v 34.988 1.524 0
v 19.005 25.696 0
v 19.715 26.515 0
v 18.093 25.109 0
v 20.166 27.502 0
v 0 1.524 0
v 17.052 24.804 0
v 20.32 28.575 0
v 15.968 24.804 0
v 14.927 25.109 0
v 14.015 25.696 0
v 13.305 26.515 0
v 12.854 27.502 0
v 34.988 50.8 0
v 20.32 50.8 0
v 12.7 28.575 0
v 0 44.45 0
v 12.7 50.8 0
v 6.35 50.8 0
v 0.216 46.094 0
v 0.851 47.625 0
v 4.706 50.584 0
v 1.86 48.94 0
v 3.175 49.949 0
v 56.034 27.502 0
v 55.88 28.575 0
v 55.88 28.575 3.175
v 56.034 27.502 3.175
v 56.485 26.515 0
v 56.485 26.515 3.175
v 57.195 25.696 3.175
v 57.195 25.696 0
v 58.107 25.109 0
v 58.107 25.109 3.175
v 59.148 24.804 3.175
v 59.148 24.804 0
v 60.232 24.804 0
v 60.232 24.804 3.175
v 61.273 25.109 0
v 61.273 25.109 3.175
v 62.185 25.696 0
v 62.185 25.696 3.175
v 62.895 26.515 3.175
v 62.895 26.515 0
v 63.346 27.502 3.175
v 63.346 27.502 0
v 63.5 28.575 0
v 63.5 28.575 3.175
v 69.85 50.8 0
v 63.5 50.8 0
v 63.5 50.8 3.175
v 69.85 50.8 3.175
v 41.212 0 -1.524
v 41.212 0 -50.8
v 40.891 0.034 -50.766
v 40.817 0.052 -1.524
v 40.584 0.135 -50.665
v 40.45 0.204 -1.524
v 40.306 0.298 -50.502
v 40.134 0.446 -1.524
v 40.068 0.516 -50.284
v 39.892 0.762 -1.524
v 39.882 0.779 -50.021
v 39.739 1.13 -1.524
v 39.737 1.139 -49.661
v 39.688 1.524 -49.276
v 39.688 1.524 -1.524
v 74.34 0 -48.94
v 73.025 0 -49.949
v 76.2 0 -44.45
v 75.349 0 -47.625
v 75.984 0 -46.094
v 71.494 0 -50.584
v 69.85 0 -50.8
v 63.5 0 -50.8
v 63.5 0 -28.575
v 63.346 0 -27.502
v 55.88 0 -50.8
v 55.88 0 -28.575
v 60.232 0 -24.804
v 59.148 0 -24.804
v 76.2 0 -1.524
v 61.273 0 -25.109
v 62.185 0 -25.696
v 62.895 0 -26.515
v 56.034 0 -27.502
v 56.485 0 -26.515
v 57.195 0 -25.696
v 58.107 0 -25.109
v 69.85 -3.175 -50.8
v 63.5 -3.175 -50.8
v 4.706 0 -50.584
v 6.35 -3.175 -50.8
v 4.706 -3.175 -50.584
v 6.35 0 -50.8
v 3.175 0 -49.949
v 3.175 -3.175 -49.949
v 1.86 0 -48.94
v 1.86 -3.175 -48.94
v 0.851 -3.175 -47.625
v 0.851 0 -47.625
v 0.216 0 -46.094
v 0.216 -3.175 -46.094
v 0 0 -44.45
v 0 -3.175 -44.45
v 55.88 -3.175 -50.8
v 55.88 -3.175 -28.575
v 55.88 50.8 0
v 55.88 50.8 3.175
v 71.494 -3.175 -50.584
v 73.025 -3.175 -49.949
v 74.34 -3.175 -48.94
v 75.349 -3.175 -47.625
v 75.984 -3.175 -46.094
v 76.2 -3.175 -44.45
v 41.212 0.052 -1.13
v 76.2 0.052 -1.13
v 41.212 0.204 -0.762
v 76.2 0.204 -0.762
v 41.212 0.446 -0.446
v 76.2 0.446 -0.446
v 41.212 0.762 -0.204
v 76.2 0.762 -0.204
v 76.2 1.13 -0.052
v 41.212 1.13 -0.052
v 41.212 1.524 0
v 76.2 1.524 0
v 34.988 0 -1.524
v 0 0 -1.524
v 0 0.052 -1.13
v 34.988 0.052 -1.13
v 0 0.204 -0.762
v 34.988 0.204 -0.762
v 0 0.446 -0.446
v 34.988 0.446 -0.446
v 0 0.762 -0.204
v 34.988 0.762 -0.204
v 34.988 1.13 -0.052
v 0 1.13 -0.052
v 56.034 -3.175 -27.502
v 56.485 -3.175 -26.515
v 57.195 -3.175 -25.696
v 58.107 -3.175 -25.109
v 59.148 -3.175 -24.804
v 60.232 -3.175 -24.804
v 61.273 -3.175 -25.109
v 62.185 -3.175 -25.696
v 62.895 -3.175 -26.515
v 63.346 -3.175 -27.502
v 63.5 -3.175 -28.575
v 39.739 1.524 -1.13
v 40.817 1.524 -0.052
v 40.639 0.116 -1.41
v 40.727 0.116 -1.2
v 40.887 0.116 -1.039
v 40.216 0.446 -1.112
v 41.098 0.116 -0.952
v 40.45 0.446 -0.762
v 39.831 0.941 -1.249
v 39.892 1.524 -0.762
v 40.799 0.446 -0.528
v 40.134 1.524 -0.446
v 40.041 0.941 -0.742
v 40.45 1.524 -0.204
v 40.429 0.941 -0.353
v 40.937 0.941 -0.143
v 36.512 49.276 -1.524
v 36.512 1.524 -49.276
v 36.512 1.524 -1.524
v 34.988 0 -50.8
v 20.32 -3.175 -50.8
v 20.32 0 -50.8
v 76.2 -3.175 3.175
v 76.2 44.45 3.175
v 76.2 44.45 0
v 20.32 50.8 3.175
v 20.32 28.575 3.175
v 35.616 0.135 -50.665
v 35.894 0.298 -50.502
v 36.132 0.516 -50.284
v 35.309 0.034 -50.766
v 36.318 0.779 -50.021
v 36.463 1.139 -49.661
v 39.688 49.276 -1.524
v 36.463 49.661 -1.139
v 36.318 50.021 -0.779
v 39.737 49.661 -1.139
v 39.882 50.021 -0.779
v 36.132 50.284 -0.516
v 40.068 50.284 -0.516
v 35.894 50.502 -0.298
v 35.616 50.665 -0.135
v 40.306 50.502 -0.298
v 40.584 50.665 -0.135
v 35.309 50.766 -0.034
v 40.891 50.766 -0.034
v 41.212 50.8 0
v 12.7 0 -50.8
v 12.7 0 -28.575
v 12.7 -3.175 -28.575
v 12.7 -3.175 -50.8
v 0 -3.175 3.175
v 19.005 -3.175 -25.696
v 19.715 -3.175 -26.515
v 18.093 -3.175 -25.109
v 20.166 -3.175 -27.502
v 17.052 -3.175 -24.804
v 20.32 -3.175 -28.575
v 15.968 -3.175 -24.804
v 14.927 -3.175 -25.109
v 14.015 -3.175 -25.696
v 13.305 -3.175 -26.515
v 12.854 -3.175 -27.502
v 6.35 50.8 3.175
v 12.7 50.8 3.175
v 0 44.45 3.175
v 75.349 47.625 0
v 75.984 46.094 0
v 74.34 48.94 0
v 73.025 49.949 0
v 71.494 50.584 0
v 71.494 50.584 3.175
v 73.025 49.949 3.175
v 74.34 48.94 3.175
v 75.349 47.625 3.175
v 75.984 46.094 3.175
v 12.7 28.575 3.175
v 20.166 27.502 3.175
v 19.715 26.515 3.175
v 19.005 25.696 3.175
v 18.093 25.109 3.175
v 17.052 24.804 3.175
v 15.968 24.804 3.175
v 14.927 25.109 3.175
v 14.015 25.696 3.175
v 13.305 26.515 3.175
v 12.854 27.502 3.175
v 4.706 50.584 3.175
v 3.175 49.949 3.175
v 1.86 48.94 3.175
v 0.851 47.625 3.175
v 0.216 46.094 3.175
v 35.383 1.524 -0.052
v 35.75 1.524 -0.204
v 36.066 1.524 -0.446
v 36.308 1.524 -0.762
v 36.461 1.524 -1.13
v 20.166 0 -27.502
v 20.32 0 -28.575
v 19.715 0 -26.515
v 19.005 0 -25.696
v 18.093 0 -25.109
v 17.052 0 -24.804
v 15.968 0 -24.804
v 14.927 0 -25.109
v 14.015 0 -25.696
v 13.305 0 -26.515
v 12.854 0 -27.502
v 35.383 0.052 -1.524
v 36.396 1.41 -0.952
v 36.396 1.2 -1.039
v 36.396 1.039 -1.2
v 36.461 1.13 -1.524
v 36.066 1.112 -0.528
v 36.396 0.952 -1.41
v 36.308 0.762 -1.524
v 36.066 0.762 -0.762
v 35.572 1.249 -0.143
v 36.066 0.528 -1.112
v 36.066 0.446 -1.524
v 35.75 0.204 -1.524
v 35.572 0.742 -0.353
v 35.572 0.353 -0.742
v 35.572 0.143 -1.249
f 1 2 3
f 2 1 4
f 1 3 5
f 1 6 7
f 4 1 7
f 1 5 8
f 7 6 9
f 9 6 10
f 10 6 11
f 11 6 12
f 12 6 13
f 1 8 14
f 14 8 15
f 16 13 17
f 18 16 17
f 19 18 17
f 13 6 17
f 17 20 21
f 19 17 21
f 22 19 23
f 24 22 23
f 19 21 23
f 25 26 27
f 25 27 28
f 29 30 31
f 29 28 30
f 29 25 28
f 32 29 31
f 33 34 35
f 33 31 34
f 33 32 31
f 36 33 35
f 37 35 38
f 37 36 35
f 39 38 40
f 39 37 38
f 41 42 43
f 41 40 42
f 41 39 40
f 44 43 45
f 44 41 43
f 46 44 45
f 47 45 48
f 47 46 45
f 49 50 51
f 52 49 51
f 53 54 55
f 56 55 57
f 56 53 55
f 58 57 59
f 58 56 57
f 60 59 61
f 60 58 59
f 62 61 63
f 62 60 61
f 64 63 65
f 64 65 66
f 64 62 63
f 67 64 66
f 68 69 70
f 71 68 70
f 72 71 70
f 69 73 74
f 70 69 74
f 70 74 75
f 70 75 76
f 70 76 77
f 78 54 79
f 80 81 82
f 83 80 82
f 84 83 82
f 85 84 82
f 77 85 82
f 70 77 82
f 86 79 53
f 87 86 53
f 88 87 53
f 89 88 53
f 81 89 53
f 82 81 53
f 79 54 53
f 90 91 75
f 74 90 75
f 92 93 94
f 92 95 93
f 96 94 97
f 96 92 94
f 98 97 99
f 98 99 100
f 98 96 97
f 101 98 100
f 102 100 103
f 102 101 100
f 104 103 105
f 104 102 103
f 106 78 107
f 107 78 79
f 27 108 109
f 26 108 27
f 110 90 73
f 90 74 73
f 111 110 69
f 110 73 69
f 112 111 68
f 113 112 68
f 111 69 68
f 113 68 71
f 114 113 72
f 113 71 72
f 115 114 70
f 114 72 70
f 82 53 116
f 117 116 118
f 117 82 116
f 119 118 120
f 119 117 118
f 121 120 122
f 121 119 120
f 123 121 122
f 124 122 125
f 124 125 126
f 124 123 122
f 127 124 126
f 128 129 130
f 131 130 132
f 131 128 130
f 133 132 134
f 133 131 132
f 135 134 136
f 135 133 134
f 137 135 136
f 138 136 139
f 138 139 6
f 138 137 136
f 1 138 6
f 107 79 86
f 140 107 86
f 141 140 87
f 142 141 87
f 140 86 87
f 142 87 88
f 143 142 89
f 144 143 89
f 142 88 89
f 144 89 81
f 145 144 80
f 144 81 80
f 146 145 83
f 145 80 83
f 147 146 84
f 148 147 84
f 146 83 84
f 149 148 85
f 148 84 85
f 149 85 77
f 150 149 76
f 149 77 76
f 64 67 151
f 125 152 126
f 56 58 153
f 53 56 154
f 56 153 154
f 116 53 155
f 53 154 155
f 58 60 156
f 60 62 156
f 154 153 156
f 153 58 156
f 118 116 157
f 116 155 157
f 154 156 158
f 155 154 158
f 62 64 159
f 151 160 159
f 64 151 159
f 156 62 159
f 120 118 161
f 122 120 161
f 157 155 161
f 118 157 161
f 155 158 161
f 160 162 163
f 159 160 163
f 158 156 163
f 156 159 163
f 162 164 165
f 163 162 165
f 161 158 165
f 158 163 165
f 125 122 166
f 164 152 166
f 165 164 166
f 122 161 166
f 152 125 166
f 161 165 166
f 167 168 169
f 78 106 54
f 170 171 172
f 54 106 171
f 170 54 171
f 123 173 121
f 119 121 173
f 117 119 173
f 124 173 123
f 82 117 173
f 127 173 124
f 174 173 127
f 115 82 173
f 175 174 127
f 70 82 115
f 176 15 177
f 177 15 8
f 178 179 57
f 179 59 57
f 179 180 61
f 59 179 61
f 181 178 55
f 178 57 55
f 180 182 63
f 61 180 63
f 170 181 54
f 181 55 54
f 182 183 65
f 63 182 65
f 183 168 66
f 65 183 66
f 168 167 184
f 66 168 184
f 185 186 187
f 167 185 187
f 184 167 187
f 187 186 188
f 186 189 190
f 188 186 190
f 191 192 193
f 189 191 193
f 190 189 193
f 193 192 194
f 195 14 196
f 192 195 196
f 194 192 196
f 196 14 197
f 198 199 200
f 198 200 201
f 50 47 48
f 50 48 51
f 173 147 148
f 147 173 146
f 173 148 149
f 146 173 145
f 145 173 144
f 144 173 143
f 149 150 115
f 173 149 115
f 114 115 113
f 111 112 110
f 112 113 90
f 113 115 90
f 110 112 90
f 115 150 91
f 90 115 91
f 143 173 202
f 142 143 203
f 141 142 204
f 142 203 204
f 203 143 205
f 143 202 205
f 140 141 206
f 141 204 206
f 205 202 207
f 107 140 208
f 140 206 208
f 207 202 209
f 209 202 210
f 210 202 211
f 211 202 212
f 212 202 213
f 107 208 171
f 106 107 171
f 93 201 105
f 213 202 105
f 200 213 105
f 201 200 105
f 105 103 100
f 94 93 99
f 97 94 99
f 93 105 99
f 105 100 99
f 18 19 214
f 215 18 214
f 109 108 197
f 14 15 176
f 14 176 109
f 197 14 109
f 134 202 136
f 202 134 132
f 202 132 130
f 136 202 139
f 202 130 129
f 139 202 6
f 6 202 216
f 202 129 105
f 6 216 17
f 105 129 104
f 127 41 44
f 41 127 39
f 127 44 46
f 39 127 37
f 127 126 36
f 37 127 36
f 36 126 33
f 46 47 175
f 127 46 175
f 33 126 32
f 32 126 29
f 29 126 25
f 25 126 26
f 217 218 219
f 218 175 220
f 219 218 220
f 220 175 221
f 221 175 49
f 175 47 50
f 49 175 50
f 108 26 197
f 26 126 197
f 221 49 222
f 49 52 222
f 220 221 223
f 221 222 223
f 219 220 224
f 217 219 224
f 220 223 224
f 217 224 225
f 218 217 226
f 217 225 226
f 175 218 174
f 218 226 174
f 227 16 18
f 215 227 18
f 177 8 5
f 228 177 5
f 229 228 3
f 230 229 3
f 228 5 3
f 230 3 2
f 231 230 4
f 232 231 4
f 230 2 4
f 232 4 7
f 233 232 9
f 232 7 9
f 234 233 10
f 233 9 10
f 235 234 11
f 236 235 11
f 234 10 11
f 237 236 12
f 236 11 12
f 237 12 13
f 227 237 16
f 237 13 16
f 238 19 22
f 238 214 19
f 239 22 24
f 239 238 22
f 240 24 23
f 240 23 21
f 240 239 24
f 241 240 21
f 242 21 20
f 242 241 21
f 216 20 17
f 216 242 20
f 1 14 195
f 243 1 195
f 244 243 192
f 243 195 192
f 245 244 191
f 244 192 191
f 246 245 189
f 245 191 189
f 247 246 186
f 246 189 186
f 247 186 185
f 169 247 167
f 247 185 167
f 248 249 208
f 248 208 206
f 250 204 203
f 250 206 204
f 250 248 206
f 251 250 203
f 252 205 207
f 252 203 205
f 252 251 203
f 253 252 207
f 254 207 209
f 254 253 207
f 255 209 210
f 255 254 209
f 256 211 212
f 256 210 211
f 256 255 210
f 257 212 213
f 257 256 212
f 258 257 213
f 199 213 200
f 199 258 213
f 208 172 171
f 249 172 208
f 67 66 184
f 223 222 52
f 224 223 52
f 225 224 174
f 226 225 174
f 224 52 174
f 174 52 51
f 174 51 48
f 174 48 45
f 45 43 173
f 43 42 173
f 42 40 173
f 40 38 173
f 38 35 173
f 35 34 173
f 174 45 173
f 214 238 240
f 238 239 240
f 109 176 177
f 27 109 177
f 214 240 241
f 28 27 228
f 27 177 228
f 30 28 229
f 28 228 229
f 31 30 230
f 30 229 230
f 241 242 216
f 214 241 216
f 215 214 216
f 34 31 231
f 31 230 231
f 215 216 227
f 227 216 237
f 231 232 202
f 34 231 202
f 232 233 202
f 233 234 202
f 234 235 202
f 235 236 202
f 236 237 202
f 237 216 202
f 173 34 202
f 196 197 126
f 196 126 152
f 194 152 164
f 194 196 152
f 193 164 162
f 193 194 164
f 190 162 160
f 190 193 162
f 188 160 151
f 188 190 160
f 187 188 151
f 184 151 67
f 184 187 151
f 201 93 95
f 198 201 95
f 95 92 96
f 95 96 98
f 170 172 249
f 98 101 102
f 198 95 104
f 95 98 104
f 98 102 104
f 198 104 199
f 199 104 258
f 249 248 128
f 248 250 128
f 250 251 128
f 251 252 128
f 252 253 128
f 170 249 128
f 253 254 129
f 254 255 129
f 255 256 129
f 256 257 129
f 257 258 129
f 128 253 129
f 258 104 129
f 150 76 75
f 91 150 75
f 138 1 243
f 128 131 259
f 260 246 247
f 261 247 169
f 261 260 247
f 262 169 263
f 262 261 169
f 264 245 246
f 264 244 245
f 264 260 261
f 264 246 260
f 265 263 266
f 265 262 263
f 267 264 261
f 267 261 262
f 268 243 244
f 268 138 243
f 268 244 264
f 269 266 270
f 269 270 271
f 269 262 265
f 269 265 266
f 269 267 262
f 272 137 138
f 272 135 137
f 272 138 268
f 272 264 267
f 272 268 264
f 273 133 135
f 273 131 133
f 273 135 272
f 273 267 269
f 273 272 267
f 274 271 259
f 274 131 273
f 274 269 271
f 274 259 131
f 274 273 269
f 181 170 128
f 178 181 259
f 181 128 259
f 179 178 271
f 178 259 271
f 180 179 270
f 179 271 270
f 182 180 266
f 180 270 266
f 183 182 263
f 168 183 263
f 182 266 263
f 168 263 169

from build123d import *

# Parameters (mm, degrees)
EXTRUDE_THIN1_DEPTH = 76.2
FILLET1_R           = 6.35
BOSS_EXTRUDE1_REACH = 88.253
SKETCH2_W           = 3.175
SKETCH2_H           = 71.842048968
CUT_EXTRUDE1_DEPTH  = 105.726882891
CUT_EXTRUDE2_DEPTH  = 105.726882891
FILLET2_R           = 1.524


with BuildPart() as part:
    # Sketch1 → Extrude-Thin1 (new body)
    with BuildSketch(Plane(origin=(0, 0, 0), x_dir=(0, 0, -1), z_dir=(1, 0, 0))):
        Polygon((50.8, 0), (0, 0), (0, 50.8), (-3.175, 50.8), (-3.175, -3.175), (50.8, -3.175), align=None)
    extrude(amount=EXTRUDE_THIN1_DEPTH)

    # Fillet1
    fillet1_edges = [part.edges().sort_by_distance(p)[0] for p in [
        (76.2, -1.5875, -50.8),
        (0, -1.5875, -50.8),
        (0, 50.8, 1.5875),
        (76.2, 50.8, 1.5875),
    ]]
    fillet(fillet1_edges, radius=FILLET1_R)

    # Sketch2 → Boss-Extrude1 (add, up to next)
    with BuildSketch(Plane(origin=(0, 25.4, -25.4), x_dir=(1, 0, 0), z_dir=(0, -0.7071067811865477, 0.7071067811865475)), mode=Mode.PRIVATE) as boss_extrude1_sk1:
        with Locations((38.1, 0)):
            Rectangle(SKETCH2_W, SKETCH2_H)
    boss_extrude1_tool1 = extrude(boss_extrude1_sk1.sketch, amount=BOSS_EXTRUDE1_REACH, mode=Mode.PRIVATE) - part.part
    add(boss_extrude1_tool1.solids().sort_by_distance((38.1, 25.4, -25.4))[0])

    # Sketch3 → Cut-Extrude1 (cut, through all)
    with BuildSketch(Plane.XY):
        with BuildLine():
            Line((12.7, 28.575), (12.7, 73.025))
            ThreePointArc((12.7, 73.025), (16.51, 76.835), (20.32, 73.025))
            Line((20.32, 73.025), (20.32, 28.575))
            ThreePointArc((20.32, 28.575), (16.51, 24.765), (12.7, 28.575))
        make_face()
        with BuildLine():
            Line((63.5, 28.575), (63.5, 73.025))
            ThreePointArc((63.5, 73.025), (59.69, 76.835), (55.88, 73.025))
            Line((55.88, 73.025), (55.88, 28.575))
            ThreePointArc((55.88, 28.575), (59.69, 24.765), (63.5, 28.575))
        make_face()
    extrude(amount=CUT_EXTRUDE1_DEPTH, mode=Mode.SUBTRACT)

    # Sketch4 → Cut-Extrude2 (cut, through all)
    with BuildSketch(Plane(origin=(0, 0, 0), x_dir=(1, 0, 0), z_dir=(0, 1, 0))):
        with BuildLine():
            Line((20.32, 73.025), (20.32, 28.575))
            ThreePointArc((20.32, 28.575), (16.51, 24.765), (12.7, 28.575))
            Line((12.7, 28.575), (12.7, 73.025))
            ThreePointArc((12.7, 73.025), (16.51, 76.835), (20.32, 73.025))
        make_face()
        with BuildLine():
            Line((55.88, 73.025), (55.88, 28.575))
            ThreePointArc((55.88, 28.575), (59.69, 24.765), (63.5, 28.575))
            Line((63.5, 28.575), (63.5, 73.025))
            ThreePointArc((63.5, 73.025), (59.69, 76.835), (55.88, 73.025))
        make_face()
    extrude(amount=-CUT_EXTRUDE2_DEPTH, mode=Mode.SUBTRACT)

    # Fillet2
    fillet2_edges = [part.edges().sort_by_distance(p)[0] for p in [
        (18.25625, 0, 0),
        (39.6875, 25.4, 0),
        (36.5125, 25.4, 0),
        (39.6875, 0, -25.4),
        (36.5125, 0, -25.4),
        (57.94375, 0, 0),
    ]]
    fillet(fillet2_edges, radius=FILLET2_R)


solid = part.part
